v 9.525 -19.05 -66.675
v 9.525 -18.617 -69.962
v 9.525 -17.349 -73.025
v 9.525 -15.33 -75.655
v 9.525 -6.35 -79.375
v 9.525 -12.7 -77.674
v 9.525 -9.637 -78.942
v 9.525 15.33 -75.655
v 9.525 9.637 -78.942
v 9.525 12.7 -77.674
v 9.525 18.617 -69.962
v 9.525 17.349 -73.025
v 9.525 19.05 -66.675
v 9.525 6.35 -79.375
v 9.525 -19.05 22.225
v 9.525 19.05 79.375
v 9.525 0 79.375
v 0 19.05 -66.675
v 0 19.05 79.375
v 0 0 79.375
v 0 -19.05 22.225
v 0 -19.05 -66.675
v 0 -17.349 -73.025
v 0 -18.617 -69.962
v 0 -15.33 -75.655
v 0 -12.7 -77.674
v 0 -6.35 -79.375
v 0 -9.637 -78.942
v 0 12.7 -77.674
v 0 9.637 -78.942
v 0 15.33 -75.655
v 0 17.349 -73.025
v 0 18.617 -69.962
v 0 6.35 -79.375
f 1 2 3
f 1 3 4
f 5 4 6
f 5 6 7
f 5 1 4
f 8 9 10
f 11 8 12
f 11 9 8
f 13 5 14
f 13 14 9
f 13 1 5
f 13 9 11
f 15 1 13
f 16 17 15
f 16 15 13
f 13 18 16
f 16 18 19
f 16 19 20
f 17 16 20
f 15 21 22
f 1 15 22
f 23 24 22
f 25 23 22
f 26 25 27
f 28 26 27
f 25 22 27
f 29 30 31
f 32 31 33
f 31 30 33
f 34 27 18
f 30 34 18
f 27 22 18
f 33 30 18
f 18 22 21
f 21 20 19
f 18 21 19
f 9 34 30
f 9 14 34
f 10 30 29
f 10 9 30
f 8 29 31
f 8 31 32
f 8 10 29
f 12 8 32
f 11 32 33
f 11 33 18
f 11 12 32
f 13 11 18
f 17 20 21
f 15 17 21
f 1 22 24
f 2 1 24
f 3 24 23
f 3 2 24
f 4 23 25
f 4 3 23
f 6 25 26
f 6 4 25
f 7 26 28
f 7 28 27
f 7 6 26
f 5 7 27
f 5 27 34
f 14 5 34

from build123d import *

# Parameters (mm, degrees)
F1_DEPTH = 9.525
F2_R     = 12.7


# Not quite as in the source:
# - a feature names something its author has since deleted; it is built from what else it names


with BuildPart() as f1:
    # F0 (on Right) → F1 (new body)
    with BuildSketch(Plane.YZ):
        Polygon((-19.05, 22.225), (-19.05, -79.375), (19.05, -79.375), (19.05, 79.375), (0, 79.375), align=None)
    extrude(amount=F1_DEPTH)

    # F2
    f2_edges = [f1.edges().sort_by_distance(p)[0] for p in [
        (4.7625, -19.05, -79.375),
        (4.7625, 19.05, -79.375),
    ]]
    fillet(f2_edges, radius=F2_R)


solid = f1.part
